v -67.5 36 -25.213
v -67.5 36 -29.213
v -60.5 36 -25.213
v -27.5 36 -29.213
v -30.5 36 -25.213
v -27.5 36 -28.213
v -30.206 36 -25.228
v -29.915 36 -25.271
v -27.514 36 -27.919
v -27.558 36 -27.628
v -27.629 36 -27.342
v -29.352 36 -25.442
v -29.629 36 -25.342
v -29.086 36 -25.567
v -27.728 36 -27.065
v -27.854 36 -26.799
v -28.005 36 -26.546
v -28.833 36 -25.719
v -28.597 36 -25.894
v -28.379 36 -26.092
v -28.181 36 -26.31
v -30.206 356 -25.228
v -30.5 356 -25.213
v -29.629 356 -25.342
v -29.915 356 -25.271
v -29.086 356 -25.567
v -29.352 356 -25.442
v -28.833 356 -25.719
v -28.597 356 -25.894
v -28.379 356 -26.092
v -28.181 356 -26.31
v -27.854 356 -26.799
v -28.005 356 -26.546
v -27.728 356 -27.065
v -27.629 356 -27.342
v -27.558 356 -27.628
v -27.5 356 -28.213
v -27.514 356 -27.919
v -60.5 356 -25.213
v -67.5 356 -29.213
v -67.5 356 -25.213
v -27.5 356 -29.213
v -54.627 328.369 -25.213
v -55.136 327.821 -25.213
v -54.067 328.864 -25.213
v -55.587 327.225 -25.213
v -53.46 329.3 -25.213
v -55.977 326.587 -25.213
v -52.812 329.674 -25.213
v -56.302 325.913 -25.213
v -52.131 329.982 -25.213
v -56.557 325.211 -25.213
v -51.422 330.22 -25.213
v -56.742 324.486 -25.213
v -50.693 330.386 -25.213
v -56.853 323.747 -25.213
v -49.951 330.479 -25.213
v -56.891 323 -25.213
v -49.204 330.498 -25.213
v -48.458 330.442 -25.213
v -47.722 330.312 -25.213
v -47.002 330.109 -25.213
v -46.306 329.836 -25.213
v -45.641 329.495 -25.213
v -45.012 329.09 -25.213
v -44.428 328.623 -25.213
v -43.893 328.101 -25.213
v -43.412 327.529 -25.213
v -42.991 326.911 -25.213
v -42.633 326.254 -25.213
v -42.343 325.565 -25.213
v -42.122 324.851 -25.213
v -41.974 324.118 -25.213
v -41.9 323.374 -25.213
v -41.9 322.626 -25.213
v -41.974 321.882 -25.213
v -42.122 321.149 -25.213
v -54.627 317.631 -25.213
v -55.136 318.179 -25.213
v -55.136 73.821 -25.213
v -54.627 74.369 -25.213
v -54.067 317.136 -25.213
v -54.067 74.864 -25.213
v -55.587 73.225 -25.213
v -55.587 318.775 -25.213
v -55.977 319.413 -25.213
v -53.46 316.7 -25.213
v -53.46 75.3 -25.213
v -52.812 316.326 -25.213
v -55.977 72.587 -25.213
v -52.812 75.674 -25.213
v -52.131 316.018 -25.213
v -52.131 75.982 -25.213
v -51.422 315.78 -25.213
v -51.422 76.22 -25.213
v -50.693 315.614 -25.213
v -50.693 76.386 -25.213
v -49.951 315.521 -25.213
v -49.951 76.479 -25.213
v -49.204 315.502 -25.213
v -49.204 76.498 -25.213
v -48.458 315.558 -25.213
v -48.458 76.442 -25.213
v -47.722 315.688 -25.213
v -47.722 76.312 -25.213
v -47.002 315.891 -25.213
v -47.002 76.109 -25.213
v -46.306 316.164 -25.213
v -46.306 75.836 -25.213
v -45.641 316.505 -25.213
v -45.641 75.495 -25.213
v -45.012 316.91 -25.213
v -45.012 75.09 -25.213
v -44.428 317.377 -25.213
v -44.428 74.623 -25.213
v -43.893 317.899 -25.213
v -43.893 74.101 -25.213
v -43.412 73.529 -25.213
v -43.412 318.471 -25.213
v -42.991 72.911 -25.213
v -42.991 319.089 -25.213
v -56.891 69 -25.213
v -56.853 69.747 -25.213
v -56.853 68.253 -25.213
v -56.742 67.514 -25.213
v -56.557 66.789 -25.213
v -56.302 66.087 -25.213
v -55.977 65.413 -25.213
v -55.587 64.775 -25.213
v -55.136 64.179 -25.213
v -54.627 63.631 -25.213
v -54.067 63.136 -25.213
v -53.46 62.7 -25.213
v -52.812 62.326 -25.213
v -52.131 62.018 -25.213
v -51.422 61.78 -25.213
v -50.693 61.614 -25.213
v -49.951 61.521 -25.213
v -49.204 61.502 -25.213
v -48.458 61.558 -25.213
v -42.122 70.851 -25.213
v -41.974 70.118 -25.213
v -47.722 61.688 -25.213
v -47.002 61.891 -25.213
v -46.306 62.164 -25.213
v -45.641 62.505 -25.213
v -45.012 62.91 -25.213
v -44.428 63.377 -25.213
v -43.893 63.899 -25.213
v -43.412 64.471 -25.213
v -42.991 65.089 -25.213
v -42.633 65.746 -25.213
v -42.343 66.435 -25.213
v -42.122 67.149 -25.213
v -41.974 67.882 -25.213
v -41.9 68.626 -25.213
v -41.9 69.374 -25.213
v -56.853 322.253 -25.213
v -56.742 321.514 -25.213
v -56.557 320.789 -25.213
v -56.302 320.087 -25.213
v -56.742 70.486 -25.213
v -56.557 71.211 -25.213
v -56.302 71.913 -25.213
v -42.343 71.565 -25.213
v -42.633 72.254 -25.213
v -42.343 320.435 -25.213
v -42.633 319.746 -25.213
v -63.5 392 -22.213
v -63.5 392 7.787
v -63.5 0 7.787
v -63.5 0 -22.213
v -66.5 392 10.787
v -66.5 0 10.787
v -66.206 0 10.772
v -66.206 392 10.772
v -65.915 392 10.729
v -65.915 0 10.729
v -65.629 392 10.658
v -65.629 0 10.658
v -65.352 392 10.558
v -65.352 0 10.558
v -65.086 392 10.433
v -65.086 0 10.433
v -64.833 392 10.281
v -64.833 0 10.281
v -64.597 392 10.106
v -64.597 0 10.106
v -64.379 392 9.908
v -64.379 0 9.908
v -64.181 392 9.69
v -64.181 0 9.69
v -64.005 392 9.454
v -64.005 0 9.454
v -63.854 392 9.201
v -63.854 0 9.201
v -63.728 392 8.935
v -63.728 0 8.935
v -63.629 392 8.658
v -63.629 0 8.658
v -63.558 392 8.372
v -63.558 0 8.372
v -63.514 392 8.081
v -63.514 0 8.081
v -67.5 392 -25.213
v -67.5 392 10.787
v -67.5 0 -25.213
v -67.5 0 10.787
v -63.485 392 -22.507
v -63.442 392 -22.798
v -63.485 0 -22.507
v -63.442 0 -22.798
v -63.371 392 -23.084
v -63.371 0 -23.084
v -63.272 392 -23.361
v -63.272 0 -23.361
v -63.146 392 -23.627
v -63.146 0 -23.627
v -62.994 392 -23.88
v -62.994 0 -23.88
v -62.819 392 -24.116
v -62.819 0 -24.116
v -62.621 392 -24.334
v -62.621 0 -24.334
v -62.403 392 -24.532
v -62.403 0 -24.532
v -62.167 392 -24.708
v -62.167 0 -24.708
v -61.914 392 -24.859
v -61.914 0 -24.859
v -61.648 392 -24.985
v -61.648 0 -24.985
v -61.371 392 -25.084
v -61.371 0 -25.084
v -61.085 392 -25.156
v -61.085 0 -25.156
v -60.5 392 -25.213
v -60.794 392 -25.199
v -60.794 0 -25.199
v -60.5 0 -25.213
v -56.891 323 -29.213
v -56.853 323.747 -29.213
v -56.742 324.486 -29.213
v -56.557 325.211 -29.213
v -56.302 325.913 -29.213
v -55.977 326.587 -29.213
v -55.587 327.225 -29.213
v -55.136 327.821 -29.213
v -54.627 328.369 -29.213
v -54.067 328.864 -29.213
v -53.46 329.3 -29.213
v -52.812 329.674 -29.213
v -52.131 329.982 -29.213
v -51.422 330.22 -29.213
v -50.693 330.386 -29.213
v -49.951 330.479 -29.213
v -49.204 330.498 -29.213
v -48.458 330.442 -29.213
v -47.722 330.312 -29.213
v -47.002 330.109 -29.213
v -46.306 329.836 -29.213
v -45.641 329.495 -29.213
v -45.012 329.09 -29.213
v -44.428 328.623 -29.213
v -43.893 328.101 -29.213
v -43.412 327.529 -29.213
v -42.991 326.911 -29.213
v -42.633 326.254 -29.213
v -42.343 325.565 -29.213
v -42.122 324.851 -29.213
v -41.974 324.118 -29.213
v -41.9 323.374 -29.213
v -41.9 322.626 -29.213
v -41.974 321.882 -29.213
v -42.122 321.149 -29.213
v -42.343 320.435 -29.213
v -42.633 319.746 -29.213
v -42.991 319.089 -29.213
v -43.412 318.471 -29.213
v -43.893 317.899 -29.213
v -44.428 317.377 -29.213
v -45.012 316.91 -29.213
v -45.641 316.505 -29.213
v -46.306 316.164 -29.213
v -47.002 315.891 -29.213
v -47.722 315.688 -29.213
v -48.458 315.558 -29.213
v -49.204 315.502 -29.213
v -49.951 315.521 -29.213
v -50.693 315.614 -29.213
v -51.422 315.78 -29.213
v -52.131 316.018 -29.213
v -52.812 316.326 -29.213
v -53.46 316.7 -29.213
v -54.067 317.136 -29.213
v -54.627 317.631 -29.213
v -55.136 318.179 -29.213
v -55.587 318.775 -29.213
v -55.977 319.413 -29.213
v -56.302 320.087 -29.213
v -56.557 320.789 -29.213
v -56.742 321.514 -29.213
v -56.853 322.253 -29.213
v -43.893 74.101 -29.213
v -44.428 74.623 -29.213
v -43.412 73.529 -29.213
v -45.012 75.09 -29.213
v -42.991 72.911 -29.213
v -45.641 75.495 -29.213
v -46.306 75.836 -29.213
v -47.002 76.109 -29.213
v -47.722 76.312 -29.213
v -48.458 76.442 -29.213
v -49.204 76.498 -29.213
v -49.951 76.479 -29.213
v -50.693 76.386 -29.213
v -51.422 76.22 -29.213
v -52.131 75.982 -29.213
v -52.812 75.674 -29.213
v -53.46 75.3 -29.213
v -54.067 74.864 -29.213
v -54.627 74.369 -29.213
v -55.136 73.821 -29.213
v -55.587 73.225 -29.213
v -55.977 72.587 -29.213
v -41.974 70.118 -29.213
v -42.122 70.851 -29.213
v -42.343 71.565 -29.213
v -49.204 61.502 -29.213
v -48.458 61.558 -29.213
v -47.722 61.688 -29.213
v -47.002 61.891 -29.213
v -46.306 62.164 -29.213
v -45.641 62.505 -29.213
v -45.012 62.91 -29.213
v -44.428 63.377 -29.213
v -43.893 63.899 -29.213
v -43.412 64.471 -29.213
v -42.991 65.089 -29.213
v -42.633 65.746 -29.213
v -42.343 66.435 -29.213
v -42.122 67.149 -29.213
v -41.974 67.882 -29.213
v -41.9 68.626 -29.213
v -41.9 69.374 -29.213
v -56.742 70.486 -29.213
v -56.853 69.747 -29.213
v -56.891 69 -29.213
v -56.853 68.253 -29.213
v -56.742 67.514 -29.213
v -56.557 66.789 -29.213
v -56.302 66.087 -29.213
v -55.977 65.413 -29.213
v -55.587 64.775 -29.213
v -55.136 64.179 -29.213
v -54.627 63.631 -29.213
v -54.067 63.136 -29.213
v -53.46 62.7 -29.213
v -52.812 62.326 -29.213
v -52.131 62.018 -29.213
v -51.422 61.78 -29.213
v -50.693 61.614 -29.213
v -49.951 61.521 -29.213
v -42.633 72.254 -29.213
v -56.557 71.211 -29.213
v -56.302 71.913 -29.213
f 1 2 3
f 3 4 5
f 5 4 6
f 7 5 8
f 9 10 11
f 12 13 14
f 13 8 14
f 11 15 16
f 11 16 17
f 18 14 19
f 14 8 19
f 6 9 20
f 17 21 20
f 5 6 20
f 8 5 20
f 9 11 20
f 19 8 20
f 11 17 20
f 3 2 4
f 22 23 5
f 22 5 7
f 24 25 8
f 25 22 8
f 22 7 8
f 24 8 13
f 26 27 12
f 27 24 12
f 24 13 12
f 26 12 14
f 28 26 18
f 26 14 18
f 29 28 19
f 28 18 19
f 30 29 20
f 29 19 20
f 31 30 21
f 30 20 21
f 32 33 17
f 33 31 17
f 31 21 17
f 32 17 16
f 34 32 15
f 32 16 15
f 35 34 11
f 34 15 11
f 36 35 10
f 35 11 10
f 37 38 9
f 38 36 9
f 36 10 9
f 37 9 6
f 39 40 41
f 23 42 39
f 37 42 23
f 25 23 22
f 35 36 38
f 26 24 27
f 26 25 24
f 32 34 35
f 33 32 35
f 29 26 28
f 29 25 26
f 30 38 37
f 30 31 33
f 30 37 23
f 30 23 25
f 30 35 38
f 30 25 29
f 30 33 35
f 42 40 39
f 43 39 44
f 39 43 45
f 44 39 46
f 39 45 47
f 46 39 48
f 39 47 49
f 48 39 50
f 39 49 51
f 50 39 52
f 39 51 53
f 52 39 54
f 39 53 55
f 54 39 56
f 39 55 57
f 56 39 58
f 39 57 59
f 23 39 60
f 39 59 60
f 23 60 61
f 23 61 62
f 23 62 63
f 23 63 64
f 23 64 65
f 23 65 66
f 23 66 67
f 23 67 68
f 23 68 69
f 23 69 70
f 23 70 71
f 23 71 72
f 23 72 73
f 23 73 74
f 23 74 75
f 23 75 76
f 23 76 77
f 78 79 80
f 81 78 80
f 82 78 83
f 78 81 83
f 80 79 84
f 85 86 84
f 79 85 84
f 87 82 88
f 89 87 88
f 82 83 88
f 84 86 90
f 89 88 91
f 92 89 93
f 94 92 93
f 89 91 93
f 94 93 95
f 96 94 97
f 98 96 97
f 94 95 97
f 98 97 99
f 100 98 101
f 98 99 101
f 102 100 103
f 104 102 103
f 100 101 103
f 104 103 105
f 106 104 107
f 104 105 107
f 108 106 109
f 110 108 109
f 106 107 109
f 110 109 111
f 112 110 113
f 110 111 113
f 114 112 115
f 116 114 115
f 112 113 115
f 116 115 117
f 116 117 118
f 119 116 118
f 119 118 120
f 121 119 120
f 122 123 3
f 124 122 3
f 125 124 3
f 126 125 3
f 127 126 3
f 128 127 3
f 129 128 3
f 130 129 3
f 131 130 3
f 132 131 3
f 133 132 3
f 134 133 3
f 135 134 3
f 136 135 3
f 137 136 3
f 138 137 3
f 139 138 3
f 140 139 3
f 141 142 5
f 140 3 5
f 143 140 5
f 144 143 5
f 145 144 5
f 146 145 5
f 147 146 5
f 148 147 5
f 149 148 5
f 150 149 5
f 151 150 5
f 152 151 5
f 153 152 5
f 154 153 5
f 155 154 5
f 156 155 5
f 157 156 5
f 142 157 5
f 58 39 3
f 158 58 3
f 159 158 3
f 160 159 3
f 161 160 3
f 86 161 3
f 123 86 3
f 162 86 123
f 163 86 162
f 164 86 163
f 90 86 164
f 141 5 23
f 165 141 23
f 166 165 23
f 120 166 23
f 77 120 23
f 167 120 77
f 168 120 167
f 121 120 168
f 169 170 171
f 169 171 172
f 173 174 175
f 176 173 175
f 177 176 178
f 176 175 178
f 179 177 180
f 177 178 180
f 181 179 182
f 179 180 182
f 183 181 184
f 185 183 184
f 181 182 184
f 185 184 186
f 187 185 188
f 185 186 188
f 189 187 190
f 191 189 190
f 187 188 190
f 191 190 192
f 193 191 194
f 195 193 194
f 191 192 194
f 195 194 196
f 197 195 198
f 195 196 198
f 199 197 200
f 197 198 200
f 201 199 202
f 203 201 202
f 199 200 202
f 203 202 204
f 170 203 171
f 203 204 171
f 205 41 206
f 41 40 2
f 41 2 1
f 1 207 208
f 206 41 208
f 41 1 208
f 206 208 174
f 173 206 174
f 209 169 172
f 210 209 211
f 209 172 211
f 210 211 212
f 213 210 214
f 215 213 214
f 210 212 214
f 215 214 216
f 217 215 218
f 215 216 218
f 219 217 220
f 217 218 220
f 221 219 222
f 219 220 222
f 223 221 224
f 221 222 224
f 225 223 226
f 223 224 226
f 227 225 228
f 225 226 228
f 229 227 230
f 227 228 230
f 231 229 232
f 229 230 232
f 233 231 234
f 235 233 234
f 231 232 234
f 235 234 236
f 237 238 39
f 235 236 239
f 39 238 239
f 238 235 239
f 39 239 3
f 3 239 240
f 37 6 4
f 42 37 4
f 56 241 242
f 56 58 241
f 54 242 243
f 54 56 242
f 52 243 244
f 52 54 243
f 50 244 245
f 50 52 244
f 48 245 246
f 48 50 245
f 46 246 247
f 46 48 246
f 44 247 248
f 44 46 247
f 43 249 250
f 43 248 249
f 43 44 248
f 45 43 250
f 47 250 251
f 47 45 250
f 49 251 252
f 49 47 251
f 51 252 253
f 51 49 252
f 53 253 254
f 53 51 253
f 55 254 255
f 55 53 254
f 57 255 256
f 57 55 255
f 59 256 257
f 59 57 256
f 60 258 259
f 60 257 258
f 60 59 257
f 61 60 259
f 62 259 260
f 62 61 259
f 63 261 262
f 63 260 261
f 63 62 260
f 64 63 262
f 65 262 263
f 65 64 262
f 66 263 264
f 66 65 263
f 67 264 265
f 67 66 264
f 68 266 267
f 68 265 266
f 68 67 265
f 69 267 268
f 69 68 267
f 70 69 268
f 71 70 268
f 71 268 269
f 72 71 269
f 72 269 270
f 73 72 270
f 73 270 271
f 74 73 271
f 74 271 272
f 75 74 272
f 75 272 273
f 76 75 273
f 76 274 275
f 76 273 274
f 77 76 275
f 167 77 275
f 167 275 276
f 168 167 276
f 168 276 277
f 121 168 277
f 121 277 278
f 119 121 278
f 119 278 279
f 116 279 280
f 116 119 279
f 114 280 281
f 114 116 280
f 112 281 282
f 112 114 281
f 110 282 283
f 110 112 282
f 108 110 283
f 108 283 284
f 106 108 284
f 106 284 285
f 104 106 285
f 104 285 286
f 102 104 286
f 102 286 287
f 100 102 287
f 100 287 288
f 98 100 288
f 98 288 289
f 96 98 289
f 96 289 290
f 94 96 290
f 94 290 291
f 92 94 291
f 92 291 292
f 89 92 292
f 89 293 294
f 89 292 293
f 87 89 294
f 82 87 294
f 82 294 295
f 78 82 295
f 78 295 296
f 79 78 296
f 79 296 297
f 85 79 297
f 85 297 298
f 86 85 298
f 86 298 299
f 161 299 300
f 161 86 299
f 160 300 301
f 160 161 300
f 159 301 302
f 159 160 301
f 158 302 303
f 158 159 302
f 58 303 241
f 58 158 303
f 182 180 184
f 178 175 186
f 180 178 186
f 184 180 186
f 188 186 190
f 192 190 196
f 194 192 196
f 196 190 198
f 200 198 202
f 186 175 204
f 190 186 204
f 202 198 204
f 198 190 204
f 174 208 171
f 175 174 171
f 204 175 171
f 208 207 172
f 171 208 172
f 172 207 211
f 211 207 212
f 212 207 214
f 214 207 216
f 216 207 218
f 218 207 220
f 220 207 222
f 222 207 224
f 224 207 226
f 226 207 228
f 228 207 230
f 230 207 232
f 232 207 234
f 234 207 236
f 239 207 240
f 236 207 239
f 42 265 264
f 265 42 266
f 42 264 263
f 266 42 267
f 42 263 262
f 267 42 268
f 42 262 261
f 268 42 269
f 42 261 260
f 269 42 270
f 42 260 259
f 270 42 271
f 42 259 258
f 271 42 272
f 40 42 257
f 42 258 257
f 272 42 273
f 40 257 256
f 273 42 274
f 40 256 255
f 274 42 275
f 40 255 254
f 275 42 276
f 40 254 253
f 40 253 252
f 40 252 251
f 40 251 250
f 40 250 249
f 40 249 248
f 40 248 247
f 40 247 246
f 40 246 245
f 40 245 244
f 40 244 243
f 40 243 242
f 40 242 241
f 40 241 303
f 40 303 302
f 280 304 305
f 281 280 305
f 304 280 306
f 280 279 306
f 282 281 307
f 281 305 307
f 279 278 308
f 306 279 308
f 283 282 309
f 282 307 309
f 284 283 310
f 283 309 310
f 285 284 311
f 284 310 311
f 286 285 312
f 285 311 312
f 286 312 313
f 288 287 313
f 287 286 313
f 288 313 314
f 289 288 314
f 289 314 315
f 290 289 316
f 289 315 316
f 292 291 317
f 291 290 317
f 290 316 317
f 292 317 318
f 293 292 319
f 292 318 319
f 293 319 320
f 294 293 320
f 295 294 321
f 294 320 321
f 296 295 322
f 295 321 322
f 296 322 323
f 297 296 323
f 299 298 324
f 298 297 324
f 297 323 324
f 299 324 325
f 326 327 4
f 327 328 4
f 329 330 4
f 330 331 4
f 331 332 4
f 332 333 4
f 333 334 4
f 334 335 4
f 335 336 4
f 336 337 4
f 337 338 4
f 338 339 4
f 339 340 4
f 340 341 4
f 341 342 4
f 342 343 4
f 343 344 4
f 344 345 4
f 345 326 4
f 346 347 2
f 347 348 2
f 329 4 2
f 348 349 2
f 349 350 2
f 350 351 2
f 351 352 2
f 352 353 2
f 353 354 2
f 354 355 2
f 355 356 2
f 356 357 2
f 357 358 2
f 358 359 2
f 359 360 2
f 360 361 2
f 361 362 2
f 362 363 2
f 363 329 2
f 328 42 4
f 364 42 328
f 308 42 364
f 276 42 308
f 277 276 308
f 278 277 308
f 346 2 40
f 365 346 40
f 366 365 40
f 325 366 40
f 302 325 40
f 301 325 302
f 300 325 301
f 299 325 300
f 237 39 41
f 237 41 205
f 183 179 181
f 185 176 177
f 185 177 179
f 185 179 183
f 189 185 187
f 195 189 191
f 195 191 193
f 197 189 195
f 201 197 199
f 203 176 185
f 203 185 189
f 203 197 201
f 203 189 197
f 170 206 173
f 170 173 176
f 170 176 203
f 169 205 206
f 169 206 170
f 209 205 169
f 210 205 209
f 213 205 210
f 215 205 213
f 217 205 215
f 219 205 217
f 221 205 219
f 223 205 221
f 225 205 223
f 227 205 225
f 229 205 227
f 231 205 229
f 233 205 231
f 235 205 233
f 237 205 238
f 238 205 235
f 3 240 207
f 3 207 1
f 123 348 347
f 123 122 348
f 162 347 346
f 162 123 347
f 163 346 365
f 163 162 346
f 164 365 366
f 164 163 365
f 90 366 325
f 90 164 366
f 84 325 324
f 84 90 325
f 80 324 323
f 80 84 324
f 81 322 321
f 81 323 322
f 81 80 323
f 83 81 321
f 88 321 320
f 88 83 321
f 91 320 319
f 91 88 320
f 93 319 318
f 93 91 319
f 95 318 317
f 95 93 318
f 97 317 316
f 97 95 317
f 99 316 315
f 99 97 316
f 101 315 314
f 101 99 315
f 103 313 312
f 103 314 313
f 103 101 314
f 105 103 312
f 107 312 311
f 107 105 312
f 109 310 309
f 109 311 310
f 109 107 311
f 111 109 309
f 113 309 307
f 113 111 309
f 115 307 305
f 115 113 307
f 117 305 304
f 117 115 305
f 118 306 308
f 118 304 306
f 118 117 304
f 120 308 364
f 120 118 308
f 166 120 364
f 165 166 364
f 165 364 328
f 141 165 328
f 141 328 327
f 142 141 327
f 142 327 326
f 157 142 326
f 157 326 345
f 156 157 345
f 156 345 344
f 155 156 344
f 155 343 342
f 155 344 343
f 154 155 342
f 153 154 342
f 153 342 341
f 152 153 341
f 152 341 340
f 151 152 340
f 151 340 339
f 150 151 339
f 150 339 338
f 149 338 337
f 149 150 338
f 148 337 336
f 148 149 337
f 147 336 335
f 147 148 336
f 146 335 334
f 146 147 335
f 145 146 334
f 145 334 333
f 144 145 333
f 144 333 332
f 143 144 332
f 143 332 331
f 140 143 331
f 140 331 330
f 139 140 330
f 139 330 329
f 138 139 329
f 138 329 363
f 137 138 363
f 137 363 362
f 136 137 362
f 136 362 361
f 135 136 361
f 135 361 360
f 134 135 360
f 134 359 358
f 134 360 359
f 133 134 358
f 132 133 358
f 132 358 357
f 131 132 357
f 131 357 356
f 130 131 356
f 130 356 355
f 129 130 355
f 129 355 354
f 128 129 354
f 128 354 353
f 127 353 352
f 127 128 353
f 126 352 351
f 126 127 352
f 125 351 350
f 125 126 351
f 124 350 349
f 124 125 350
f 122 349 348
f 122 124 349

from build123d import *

# Parameters (mm, degrees)
BOSS_EXTRUDE1_DEPTH     = 392
CUT_EXTRUDE1_DEPTH      = 396.116955248
CUT_EXTRUDE1_DEPTH_BACK = 396.116955248
SKETCH2_W               = 4
SKETCH2_H               = 36
CUT_EXTRUDE2_DEPTH      = 400.775227771
CUT_EXTRUDE2_DEPTH_BACK = 400.775227771
SKETCH3_R               = 7.5


with BuildPart() as part:
    # Sketch1 → Boss-Extrude1 (new body)
    with BuildSketch(Plane(origin=(0, 0, 0), x_dir=(1, 0, 0), z_dir=(0, 1, 0))):
        with BuildLine():
            Line((-27.499872145, 29.213153277), (-67.499872145, 29.213153277))
            Line((-67.499872145, 29.213153277), (-67.499872145, -10.786846723))
            Line((-67.499872145, -10.786846723), (-66.499872145, -10.786846723))
            ThreePointArc((-66.499872145, -10.786846723), (-64.378551801, -9.908167067), (-63.499872145, -7.786846723))
            Line((-63.499872145, -7.786846723), (-63.499872145, 22.213153277))
            ThreePointArc((-63.499872145, 22.213153277), (-62.621192489, 24.334473621), (-60.499872145, 25.213153277))
            Line((-60.499872145, 25.213153277), (-30.499872145, 25.213153277))
            ThreePointArc((-30.499872145, 25.213153277), (-28.378551801, 26.091832933), (-27.499872145, 28.213153277))
            Line((-27.499872145, 28.213153277), (-27.499872145, 29.213153277))
        make_face()
    extrude(amount=BOSS_EXTRUDE1_DEPTH)

    # Sketch2 → Cut-Extrude1 (cut, two sides: drawn at the far end of the back side and taken through both)
    with BuildSketch(Plane.ZY.offset(67.499872145).offset(-CUT_EXTRUDE1_DEPTH_BACK)):
        with Locations((-27.213153277, 374)):
            Rectangle(SKETCH2_W, SKETCH2_H)
        with Locations((-27.213153277, 18)):
            Rectangle(SKETCH2_W, SKETCH2_H)
    extrude(amount=CUT_EXTRUDE1_DEPTH + CUT_EXTRUDE1_DEPTH_BACK, mode=Mode.SUBTRACT)

    # Sketch3 → Cut-Extrude2 (cut, two sides: drawn at the far end of the back side and taken through both)
    with BuildSketch(Plane(origin=(0, 0, -29.213153277), x_dir=(-1, 0, 0), z_dir=(0, 0, -1)).offset(-CUT_EXTRUDE2_DEPTH_BACK)):
        with Locations((49.390570274, 323)):
            Circle(SKETCH3_R)
        with Locations((49.390570274, 69)):
            Circle(SKETCH3_R)
    extrude(amount=CUT_EXTRUDE2_DEPTH + CUT_EXTRUDE2_DEPTH_BACK, mode=Mode.SUBTRACT)


solid = part.part
